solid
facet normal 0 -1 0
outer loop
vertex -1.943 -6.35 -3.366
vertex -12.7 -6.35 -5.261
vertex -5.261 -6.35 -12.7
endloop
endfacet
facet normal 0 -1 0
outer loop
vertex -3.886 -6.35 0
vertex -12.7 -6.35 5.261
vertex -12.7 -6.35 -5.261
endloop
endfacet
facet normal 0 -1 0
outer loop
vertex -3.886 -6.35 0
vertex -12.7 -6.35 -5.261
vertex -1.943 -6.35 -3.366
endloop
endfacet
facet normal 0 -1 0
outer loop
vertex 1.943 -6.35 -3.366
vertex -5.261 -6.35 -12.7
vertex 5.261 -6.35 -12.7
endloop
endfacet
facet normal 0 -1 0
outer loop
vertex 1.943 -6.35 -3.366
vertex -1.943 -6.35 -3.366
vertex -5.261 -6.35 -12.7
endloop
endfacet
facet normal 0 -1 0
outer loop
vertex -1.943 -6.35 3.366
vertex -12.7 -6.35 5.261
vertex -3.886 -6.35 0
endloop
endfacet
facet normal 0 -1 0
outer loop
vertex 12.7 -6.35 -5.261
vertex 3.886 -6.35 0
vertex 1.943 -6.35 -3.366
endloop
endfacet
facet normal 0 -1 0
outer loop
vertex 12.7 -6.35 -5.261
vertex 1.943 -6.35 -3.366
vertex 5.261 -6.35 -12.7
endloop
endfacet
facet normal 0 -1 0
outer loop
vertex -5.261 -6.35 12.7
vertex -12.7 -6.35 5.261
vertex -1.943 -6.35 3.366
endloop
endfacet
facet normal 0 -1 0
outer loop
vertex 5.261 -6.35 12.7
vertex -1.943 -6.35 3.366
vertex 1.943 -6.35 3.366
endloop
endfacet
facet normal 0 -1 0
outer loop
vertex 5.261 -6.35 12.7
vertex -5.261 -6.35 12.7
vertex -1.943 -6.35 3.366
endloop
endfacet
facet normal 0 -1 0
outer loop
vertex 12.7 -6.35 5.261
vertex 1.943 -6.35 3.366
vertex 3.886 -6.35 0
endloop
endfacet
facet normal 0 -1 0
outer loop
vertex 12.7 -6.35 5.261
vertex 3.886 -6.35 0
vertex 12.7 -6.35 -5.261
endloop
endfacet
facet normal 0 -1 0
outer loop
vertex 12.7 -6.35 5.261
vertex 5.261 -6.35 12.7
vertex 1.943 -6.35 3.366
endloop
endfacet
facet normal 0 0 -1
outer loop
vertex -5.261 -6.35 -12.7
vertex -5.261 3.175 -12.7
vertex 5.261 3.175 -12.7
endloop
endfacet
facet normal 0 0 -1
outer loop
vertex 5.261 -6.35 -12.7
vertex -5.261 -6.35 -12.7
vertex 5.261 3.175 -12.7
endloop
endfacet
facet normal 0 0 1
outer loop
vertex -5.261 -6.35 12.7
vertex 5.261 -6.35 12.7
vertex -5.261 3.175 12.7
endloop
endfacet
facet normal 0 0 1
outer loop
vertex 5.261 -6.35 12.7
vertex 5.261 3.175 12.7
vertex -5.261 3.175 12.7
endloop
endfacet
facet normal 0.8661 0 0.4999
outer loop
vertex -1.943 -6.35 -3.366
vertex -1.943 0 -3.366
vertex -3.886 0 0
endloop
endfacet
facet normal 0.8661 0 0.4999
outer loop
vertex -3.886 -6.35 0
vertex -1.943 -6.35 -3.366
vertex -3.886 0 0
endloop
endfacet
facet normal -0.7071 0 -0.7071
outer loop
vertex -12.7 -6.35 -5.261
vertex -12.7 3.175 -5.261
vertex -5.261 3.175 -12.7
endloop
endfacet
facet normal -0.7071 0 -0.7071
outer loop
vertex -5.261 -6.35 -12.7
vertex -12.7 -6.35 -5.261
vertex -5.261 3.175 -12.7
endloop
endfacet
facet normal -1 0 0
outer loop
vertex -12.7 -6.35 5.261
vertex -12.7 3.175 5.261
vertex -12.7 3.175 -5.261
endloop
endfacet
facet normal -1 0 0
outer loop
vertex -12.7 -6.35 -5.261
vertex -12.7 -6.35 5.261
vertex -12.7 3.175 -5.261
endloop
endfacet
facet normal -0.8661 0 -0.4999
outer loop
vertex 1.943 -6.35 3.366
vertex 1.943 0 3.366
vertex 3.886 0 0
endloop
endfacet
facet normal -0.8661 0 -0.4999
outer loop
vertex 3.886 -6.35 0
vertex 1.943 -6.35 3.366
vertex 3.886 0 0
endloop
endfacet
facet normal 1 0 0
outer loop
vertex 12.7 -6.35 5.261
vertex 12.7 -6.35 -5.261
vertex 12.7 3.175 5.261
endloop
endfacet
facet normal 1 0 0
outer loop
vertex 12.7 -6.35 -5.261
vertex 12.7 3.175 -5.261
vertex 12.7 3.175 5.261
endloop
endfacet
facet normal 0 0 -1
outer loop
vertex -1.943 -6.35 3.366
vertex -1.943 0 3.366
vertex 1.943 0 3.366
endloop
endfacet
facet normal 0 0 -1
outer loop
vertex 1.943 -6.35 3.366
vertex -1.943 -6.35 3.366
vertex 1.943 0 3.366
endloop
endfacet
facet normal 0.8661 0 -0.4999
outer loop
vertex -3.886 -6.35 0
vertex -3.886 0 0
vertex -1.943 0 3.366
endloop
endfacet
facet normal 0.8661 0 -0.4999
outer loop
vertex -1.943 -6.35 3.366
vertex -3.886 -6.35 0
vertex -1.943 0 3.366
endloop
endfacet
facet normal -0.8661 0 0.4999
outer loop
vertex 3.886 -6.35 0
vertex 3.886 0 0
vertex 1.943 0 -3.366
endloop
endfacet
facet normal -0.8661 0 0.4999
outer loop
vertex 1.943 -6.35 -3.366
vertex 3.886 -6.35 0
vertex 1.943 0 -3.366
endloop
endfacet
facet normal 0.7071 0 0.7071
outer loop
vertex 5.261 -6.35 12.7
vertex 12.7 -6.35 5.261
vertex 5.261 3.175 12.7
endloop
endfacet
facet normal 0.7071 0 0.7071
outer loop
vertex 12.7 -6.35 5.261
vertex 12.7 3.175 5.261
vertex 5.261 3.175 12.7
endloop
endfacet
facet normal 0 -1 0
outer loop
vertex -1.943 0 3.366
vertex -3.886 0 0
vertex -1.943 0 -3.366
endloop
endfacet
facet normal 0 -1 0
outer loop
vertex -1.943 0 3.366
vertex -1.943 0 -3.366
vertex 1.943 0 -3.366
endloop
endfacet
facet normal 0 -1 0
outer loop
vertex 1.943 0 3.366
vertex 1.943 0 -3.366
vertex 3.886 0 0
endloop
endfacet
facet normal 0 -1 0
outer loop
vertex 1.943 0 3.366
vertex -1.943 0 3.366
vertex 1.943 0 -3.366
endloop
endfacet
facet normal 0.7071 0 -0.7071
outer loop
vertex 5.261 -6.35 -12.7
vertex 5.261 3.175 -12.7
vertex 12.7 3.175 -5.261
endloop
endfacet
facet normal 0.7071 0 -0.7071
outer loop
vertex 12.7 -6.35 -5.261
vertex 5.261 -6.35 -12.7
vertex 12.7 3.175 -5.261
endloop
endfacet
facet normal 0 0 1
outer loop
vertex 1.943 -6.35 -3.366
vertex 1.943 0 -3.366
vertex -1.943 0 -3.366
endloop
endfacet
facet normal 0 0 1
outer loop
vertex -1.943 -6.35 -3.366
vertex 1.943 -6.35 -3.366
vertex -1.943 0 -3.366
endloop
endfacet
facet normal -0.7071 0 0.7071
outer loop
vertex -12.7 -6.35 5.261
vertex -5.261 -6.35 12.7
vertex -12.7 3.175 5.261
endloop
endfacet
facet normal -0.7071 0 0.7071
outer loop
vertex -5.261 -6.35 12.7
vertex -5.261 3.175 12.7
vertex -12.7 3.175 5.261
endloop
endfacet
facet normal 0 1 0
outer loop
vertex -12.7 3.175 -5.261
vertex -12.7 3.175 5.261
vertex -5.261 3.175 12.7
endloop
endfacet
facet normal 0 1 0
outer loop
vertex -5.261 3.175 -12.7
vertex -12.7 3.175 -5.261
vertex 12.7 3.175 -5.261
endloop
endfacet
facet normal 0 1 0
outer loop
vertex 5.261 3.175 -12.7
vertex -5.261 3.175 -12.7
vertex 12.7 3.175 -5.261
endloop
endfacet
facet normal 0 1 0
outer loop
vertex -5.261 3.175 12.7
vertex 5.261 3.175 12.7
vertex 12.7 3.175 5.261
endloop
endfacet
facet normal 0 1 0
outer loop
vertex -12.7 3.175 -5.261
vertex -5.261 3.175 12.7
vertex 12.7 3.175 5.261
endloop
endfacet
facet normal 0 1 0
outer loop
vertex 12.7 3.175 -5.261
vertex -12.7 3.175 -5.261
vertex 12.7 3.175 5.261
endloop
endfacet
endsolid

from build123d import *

# Parameters (mm, degrees)
F1_DEPTH = 3.175
F3_DEPTH = 6.35


with BuildPart() as f1:
    # F0 (on Front) → F1 (new body)
    with BuildSketch(Plane.XZ):
        Polygon((5.260512, 12.7), (-5.260512, 12.7), (-12.7, 5.260512), (-12.7, -5.260512), (-5.260512, -12.7), (5.260512, -12.7), (12.7, -5.260512), (12.7, 5.260512), align=None)
    extrude(amount=-F1_DEPTH)

    # F2 (on face) → F3 (join)
    with BuildSketch(Plane.XZ):
        Polygon((5.260512, -12.7), (12.7, -5.260512), (12.7, 5.260512), (5.260512, 12.7), (-5.260512, 12.7), (-12.7, 5.260512), (-12.7, -5.260512), (-5.260512, -12.7), align=None)
        Polygon((-3.886145, 0), (-1.943072, 3.3655), (1.943072, 3.3655), (3.886145, 0), (1.943072, -3.3655), (-1.943072, -3.3655), align=None, mode=Mode.SUBTRACT)
    extrude(amount=F3_DEPTH)


solid = f1.part
